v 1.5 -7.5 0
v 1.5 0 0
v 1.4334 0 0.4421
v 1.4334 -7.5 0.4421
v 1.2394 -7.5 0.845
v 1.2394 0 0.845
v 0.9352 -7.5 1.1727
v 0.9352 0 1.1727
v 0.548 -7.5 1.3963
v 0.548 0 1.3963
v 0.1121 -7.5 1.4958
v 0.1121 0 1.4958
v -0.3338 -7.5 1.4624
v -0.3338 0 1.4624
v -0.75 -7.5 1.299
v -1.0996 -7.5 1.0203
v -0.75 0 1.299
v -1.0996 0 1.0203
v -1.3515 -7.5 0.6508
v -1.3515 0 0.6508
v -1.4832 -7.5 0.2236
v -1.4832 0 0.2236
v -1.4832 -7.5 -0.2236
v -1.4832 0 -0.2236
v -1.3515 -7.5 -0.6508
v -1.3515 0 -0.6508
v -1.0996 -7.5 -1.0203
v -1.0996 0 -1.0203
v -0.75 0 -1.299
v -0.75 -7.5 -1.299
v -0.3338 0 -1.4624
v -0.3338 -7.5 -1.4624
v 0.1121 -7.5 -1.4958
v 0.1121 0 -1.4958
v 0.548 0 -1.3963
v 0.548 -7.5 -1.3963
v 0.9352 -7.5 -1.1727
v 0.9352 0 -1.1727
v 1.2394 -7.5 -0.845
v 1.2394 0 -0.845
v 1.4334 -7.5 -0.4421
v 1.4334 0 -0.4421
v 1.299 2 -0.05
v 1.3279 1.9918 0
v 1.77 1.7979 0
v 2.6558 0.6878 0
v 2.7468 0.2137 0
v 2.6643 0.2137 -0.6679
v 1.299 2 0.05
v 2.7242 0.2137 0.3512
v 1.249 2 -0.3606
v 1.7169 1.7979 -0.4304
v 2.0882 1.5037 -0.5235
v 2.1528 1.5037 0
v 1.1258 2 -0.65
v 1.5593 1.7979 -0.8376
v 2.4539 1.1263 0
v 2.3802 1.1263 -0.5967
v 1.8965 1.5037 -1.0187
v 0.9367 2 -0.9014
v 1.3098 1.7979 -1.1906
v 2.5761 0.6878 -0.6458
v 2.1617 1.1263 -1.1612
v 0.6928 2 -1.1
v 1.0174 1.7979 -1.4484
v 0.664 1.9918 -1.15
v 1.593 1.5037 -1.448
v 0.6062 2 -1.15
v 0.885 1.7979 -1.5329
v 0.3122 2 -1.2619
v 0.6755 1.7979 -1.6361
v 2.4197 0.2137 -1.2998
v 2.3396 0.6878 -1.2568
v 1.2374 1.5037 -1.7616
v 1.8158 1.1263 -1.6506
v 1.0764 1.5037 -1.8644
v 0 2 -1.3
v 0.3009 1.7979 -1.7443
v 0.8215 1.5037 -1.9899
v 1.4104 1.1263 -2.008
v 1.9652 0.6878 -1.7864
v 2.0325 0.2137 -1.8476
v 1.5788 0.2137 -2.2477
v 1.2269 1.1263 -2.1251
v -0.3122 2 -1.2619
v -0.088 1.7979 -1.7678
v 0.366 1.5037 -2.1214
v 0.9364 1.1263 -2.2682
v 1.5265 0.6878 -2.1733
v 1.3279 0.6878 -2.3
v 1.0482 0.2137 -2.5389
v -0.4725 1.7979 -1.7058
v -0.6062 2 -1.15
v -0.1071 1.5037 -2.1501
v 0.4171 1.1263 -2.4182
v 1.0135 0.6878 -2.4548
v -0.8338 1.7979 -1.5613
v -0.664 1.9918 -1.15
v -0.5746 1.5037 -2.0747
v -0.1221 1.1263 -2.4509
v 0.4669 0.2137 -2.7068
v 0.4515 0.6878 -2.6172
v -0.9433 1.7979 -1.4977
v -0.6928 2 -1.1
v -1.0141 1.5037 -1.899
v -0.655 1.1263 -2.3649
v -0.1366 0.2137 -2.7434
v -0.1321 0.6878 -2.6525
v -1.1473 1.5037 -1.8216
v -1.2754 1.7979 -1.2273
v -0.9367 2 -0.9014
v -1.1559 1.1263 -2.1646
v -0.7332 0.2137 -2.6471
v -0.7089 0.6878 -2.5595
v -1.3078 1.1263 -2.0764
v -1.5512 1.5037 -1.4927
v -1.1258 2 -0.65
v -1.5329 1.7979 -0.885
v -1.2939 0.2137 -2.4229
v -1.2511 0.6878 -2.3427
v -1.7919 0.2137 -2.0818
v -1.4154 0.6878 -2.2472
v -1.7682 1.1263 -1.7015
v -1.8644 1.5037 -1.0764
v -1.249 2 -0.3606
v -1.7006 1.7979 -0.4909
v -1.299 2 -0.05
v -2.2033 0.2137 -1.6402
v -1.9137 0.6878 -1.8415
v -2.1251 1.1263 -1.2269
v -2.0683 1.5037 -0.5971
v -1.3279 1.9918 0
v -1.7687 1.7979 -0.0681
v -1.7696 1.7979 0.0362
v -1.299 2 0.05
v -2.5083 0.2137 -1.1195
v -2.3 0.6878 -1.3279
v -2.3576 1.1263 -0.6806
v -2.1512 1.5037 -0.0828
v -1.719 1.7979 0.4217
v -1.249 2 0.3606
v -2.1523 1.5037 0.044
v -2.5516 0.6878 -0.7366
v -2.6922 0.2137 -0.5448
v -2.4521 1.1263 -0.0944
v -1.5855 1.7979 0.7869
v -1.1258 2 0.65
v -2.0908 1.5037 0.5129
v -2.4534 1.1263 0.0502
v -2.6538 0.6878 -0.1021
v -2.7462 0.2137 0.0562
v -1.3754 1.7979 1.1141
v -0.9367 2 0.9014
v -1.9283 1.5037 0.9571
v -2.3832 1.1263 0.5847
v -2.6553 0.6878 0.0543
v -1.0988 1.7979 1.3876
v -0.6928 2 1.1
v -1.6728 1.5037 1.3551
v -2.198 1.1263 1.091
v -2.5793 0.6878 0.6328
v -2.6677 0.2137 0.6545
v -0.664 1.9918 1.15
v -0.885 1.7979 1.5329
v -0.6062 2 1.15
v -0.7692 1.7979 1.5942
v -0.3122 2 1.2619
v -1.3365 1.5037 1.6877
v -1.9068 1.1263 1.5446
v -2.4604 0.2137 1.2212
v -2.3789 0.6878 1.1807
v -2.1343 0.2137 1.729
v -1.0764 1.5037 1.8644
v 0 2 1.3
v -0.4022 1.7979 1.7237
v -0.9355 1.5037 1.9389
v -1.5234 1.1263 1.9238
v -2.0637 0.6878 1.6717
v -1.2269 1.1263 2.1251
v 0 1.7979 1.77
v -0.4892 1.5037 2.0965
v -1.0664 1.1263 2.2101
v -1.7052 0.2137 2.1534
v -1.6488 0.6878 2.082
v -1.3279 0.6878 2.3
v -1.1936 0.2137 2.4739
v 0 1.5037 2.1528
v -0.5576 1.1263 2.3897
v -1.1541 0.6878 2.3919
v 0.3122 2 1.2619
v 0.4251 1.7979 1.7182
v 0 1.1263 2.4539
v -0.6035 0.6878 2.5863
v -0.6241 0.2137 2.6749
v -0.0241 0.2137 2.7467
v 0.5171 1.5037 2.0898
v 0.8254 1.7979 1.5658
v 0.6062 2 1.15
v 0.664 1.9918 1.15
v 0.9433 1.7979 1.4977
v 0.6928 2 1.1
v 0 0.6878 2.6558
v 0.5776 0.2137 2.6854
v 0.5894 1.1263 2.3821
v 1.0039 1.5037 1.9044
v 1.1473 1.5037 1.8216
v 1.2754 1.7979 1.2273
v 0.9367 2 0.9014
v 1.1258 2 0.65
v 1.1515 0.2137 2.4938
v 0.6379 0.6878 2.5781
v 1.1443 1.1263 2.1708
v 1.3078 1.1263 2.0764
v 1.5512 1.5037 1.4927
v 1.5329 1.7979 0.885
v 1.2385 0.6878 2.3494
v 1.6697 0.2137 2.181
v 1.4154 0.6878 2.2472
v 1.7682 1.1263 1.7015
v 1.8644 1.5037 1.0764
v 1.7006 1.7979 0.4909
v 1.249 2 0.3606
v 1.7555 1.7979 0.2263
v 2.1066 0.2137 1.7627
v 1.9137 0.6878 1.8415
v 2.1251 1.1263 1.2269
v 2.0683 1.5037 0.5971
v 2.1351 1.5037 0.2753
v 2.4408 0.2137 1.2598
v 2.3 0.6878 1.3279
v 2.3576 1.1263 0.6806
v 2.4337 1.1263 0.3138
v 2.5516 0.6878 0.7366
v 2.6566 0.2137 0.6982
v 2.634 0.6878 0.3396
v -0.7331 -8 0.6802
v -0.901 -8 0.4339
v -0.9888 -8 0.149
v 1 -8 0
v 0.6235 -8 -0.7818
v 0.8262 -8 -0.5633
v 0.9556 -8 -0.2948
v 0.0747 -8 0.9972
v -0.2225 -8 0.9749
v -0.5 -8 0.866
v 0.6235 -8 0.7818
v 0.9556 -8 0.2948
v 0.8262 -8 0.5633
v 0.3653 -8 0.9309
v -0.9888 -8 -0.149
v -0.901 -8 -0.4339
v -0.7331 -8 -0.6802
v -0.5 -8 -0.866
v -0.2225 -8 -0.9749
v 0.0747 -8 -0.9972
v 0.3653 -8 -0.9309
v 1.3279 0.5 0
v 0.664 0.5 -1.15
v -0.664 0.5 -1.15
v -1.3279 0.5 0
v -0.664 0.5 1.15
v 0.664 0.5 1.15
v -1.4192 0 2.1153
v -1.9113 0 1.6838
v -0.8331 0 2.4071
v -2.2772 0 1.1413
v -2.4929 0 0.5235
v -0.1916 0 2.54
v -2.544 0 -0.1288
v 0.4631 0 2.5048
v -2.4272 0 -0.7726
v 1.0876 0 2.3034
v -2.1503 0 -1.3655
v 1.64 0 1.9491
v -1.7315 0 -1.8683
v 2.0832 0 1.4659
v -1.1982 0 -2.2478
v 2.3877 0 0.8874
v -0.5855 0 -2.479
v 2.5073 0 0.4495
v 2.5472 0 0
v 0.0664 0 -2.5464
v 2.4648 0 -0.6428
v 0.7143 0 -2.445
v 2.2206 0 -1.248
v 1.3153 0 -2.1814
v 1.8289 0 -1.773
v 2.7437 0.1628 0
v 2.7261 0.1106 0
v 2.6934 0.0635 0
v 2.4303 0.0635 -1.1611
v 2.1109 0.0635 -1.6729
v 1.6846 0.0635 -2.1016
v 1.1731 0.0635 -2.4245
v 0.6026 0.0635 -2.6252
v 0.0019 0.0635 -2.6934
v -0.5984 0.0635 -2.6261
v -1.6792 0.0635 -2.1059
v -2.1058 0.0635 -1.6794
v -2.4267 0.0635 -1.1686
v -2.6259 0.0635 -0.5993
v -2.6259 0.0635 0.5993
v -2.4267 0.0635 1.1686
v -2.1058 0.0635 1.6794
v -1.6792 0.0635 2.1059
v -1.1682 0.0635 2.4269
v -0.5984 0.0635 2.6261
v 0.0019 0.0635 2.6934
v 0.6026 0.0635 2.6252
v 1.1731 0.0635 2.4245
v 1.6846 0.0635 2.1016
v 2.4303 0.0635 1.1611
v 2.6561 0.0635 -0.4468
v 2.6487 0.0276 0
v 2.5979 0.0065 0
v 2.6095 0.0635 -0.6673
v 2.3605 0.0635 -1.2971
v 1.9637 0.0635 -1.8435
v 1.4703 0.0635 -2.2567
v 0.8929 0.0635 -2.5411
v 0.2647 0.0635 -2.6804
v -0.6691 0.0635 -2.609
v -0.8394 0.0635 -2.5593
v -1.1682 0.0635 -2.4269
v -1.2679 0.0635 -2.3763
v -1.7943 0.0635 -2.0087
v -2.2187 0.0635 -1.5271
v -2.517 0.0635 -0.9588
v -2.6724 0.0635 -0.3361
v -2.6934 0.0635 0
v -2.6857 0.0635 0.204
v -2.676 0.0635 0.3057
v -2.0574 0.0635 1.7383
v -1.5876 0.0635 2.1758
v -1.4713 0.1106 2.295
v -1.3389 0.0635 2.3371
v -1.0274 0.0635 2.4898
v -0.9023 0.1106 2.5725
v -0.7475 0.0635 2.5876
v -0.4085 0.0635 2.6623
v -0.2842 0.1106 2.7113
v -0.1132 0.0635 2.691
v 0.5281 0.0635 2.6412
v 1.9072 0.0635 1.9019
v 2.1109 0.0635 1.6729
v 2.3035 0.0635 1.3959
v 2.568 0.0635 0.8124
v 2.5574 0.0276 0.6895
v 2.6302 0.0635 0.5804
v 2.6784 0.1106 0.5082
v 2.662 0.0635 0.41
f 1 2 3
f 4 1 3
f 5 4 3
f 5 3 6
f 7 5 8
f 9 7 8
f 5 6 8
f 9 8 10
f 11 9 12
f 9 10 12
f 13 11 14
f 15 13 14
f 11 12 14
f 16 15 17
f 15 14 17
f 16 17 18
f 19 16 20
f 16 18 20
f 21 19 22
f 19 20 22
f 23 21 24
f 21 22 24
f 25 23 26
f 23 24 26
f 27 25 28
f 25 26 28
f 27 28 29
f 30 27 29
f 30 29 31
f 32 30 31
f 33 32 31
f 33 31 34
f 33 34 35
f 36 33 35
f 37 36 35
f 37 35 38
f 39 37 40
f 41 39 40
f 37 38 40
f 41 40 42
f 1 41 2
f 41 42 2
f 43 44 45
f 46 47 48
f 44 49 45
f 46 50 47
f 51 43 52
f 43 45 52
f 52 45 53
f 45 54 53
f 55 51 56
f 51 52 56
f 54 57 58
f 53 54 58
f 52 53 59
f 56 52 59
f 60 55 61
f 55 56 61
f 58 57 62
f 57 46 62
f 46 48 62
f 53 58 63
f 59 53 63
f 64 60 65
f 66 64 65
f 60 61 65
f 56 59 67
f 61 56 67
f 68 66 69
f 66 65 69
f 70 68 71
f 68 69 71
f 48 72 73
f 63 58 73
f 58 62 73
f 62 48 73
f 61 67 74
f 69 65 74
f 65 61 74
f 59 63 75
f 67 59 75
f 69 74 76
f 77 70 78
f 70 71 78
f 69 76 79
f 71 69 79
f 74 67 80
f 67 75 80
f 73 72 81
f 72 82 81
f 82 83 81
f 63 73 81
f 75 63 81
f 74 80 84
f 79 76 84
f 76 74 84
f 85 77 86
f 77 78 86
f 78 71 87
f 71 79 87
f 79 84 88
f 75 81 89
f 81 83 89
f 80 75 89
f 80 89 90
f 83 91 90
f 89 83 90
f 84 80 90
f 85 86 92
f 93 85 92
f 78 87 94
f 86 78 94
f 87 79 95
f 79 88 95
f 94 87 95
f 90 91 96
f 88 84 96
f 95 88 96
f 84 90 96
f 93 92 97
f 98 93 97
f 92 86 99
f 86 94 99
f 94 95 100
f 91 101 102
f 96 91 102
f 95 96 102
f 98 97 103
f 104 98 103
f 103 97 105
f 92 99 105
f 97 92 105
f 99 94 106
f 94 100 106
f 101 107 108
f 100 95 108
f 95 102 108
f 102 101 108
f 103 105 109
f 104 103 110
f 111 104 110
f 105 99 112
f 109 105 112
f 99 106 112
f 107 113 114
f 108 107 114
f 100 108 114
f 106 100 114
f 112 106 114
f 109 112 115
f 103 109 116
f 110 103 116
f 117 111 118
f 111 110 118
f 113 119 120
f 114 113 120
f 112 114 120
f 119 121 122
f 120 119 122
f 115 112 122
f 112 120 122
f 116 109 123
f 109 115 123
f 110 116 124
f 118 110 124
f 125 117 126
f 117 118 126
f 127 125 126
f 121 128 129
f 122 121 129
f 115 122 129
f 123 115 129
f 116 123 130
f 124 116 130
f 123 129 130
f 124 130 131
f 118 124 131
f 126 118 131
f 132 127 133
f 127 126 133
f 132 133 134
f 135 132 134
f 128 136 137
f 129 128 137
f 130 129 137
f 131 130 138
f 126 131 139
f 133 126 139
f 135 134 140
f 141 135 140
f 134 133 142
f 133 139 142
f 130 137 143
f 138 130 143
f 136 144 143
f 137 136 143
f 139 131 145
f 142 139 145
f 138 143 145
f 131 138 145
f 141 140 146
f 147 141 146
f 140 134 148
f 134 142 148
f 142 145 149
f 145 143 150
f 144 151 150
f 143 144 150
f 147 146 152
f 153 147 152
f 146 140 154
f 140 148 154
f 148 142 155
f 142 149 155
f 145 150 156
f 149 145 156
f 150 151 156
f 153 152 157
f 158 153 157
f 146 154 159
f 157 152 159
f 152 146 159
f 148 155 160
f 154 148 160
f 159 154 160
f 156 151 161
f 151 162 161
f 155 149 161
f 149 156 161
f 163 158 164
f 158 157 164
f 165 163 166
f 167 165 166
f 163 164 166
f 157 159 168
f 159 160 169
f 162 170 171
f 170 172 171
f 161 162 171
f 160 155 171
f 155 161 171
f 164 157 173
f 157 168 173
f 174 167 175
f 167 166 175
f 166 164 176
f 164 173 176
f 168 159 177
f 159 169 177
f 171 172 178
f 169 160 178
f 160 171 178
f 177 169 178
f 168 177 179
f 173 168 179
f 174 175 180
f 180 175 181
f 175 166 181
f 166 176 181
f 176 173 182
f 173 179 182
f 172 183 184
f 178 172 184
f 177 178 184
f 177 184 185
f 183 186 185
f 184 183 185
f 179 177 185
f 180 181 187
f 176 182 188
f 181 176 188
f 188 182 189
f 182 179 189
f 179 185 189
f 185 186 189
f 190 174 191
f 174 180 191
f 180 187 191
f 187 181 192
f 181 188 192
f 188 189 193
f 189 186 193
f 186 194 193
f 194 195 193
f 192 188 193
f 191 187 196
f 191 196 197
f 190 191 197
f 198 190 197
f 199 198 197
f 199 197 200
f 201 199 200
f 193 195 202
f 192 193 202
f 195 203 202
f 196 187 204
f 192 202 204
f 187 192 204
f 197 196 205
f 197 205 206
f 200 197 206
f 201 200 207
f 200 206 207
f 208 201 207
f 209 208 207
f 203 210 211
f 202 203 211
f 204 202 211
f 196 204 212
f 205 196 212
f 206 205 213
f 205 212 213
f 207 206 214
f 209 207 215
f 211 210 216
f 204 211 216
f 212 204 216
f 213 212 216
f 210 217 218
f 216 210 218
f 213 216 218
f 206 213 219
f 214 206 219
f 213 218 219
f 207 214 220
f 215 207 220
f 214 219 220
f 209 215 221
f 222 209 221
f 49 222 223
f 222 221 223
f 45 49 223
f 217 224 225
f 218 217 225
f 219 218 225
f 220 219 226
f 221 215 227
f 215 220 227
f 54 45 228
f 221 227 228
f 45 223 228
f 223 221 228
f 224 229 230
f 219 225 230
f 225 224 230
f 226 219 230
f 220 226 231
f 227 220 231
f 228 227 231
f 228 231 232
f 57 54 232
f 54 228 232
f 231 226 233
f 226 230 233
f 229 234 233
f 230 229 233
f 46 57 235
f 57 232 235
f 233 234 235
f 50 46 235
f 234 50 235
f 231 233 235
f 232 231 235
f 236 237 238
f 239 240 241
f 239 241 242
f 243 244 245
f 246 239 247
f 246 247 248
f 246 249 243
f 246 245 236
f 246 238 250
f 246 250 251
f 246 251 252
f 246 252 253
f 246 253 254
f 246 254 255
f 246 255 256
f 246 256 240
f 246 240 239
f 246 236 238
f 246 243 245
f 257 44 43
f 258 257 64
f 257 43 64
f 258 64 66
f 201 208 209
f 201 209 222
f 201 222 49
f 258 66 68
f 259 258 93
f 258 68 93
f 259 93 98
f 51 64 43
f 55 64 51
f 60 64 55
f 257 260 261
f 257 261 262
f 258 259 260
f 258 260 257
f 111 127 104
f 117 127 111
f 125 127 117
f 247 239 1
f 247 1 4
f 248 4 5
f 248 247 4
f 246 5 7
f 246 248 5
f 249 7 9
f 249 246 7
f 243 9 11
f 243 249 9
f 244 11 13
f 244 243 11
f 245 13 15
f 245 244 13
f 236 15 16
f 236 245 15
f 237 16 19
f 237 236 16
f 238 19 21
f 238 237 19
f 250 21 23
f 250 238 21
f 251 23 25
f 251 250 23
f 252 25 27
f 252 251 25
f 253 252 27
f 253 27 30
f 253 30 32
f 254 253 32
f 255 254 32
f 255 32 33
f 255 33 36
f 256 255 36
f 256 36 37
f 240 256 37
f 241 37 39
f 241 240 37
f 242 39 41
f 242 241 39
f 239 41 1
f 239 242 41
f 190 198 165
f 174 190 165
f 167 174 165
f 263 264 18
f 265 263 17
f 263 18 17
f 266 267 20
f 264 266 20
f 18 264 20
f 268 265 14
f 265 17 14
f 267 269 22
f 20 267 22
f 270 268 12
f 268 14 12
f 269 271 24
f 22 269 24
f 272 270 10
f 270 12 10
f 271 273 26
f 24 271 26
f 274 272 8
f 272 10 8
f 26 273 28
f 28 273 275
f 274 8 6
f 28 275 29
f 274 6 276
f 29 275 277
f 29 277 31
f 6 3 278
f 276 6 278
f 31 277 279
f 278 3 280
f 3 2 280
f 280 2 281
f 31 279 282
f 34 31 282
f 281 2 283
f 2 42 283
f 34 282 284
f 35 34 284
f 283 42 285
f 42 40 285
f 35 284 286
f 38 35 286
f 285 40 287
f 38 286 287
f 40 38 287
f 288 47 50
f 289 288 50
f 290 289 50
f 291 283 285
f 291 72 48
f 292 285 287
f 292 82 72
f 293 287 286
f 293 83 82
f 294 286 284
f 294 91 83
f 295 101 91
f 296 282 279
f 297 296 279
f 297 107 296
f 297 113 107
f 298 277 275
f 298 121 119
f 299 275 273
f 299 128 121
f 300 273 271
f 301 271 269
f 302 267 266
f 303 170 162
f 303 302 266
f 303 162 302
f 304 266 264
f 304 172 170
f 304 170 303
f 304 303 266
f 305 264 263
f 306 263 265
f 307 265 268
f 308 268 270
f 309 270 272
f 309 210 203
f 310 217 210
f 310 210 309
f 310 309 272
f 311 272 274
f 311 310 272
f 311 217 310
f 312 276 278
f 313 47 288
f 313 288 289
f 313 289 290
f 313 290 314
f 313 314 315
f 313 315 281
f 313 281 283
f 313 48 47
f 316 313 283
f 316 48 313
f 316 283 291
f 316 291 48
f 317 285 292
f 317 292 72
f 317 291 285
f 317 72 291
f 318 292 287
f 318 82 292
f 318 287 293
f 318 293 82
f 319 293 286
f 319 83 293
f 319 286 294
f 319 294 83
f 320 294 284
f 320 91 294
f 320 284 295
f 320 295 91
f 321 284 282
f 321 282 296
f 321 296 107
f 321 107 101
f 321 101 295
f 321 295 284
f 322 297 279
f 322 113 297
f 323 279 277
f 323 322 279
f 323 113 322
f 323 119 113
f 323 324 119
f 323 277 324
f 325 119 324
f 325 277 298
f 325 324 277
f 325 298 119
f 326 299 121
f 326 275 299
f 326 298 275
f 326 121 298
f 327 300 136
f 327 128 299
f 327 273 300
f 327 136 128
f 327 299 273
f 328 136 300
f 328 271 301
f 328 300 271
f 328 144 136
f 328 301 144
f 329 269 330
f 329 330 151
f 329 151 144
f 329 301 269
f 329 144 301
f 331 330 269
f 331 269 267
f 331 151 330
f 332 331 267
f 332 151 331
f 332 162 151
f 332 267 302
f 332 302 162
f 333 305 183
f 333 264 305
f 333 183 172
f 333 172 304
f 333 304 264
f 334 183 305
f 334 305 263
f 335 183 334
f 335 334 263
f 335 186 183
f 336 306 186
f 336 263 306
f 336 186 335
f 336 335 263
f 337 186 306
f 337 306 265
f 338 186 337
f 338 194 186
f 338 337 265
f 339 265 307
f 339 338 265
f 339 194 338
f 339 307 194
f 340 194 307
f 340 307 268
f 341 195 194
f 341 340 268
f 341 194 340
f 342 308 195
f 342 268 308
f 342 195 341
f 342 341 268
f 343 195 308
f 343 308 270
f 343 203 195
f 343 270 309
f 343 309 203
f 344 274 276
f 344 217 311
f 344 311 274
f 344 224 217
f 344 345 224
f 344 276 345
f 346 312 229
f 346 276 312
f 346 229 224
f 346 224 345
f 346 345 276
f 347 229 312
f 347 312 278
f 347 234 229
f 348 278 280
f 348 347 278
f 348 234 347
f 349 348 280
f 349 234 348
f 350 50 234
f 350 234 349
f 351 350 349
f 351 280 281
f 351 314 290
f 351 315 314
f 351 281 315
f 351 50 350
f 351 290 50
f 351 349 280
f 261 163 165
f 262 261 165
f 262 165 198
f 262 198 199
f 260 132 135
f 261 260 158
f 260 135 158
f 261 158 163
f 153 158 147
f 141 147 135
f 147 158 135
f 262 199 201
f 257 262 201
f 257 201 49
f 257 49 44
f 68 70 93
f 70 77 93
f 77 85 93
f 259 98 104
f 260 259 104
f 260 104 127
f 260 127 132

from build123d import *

# Parameters (mm, degrees)
FILLET_1_R          = 0.2
CUT_EXTRUDE_1_DEPTH = 1.5
SKETCH_3_R          = 1.5
EXTRUDE_1_DEPTH     = 8
CHAMFER_1_SIZE      = 0.5


with BuildPart() as part:
    # 草图1 → 旋转1 (revolve)
    with BuildSketch(Plane.XY):
        with BuildLine():
            Line((0, 0), (0, 2))
            Line((0, 2), (1.3, 2))
            ThreePointArc((1.3, 2), (2.370691821, 1.250626571), (2.75, 0))
            Line((2.75, 0), (0, 0))
        make_face()
    revolve(axis=Axis((0, 0, 0), (0, 1, 0)))

    # 圆角1
    fillet_1_edges = [part.edges().sort_by_distance(p)[0] for p in [
        (-2.75, 0, 0),
    ]]
    fillet(fillet_1_edges, radius=FILLET_1_R)

    # 草图2 → 切除-拉伸1 (cut)
    with BuildSketch(Plane(origin=(0, 2, 0), x_dir=(1, 0, 0), z_dir=(0, 1, 0))):
        Polygon((1.327905619, 0), (0.66395281, 1.15), (-0.66395281, 1.15), (-1.327905619, 0), (-0.66395281, -1.15), (0.66395281, -1.15), align=None)
    extrude(amount=-CUT_EXTRUDE_1_DEPTH, mode=Mode.SUBTRACT)

    # 草图3 → 凸台-拉伸1 (add)
    with BuildSketch(Plane.XZ):
        Circle(SKETCH_3_R)
    extrude(amount=EXTRUDE_1_DEPTH)

    # 倒角1
    chamfer_1_edges = [part.edges().sort_by_distance(p)[0] for p in [
        (-1.5, -8, 0),
    ]]
    chamfer(chamfer_1_edges, length=CHAMFER_1_SIZE)


solid = part.part
